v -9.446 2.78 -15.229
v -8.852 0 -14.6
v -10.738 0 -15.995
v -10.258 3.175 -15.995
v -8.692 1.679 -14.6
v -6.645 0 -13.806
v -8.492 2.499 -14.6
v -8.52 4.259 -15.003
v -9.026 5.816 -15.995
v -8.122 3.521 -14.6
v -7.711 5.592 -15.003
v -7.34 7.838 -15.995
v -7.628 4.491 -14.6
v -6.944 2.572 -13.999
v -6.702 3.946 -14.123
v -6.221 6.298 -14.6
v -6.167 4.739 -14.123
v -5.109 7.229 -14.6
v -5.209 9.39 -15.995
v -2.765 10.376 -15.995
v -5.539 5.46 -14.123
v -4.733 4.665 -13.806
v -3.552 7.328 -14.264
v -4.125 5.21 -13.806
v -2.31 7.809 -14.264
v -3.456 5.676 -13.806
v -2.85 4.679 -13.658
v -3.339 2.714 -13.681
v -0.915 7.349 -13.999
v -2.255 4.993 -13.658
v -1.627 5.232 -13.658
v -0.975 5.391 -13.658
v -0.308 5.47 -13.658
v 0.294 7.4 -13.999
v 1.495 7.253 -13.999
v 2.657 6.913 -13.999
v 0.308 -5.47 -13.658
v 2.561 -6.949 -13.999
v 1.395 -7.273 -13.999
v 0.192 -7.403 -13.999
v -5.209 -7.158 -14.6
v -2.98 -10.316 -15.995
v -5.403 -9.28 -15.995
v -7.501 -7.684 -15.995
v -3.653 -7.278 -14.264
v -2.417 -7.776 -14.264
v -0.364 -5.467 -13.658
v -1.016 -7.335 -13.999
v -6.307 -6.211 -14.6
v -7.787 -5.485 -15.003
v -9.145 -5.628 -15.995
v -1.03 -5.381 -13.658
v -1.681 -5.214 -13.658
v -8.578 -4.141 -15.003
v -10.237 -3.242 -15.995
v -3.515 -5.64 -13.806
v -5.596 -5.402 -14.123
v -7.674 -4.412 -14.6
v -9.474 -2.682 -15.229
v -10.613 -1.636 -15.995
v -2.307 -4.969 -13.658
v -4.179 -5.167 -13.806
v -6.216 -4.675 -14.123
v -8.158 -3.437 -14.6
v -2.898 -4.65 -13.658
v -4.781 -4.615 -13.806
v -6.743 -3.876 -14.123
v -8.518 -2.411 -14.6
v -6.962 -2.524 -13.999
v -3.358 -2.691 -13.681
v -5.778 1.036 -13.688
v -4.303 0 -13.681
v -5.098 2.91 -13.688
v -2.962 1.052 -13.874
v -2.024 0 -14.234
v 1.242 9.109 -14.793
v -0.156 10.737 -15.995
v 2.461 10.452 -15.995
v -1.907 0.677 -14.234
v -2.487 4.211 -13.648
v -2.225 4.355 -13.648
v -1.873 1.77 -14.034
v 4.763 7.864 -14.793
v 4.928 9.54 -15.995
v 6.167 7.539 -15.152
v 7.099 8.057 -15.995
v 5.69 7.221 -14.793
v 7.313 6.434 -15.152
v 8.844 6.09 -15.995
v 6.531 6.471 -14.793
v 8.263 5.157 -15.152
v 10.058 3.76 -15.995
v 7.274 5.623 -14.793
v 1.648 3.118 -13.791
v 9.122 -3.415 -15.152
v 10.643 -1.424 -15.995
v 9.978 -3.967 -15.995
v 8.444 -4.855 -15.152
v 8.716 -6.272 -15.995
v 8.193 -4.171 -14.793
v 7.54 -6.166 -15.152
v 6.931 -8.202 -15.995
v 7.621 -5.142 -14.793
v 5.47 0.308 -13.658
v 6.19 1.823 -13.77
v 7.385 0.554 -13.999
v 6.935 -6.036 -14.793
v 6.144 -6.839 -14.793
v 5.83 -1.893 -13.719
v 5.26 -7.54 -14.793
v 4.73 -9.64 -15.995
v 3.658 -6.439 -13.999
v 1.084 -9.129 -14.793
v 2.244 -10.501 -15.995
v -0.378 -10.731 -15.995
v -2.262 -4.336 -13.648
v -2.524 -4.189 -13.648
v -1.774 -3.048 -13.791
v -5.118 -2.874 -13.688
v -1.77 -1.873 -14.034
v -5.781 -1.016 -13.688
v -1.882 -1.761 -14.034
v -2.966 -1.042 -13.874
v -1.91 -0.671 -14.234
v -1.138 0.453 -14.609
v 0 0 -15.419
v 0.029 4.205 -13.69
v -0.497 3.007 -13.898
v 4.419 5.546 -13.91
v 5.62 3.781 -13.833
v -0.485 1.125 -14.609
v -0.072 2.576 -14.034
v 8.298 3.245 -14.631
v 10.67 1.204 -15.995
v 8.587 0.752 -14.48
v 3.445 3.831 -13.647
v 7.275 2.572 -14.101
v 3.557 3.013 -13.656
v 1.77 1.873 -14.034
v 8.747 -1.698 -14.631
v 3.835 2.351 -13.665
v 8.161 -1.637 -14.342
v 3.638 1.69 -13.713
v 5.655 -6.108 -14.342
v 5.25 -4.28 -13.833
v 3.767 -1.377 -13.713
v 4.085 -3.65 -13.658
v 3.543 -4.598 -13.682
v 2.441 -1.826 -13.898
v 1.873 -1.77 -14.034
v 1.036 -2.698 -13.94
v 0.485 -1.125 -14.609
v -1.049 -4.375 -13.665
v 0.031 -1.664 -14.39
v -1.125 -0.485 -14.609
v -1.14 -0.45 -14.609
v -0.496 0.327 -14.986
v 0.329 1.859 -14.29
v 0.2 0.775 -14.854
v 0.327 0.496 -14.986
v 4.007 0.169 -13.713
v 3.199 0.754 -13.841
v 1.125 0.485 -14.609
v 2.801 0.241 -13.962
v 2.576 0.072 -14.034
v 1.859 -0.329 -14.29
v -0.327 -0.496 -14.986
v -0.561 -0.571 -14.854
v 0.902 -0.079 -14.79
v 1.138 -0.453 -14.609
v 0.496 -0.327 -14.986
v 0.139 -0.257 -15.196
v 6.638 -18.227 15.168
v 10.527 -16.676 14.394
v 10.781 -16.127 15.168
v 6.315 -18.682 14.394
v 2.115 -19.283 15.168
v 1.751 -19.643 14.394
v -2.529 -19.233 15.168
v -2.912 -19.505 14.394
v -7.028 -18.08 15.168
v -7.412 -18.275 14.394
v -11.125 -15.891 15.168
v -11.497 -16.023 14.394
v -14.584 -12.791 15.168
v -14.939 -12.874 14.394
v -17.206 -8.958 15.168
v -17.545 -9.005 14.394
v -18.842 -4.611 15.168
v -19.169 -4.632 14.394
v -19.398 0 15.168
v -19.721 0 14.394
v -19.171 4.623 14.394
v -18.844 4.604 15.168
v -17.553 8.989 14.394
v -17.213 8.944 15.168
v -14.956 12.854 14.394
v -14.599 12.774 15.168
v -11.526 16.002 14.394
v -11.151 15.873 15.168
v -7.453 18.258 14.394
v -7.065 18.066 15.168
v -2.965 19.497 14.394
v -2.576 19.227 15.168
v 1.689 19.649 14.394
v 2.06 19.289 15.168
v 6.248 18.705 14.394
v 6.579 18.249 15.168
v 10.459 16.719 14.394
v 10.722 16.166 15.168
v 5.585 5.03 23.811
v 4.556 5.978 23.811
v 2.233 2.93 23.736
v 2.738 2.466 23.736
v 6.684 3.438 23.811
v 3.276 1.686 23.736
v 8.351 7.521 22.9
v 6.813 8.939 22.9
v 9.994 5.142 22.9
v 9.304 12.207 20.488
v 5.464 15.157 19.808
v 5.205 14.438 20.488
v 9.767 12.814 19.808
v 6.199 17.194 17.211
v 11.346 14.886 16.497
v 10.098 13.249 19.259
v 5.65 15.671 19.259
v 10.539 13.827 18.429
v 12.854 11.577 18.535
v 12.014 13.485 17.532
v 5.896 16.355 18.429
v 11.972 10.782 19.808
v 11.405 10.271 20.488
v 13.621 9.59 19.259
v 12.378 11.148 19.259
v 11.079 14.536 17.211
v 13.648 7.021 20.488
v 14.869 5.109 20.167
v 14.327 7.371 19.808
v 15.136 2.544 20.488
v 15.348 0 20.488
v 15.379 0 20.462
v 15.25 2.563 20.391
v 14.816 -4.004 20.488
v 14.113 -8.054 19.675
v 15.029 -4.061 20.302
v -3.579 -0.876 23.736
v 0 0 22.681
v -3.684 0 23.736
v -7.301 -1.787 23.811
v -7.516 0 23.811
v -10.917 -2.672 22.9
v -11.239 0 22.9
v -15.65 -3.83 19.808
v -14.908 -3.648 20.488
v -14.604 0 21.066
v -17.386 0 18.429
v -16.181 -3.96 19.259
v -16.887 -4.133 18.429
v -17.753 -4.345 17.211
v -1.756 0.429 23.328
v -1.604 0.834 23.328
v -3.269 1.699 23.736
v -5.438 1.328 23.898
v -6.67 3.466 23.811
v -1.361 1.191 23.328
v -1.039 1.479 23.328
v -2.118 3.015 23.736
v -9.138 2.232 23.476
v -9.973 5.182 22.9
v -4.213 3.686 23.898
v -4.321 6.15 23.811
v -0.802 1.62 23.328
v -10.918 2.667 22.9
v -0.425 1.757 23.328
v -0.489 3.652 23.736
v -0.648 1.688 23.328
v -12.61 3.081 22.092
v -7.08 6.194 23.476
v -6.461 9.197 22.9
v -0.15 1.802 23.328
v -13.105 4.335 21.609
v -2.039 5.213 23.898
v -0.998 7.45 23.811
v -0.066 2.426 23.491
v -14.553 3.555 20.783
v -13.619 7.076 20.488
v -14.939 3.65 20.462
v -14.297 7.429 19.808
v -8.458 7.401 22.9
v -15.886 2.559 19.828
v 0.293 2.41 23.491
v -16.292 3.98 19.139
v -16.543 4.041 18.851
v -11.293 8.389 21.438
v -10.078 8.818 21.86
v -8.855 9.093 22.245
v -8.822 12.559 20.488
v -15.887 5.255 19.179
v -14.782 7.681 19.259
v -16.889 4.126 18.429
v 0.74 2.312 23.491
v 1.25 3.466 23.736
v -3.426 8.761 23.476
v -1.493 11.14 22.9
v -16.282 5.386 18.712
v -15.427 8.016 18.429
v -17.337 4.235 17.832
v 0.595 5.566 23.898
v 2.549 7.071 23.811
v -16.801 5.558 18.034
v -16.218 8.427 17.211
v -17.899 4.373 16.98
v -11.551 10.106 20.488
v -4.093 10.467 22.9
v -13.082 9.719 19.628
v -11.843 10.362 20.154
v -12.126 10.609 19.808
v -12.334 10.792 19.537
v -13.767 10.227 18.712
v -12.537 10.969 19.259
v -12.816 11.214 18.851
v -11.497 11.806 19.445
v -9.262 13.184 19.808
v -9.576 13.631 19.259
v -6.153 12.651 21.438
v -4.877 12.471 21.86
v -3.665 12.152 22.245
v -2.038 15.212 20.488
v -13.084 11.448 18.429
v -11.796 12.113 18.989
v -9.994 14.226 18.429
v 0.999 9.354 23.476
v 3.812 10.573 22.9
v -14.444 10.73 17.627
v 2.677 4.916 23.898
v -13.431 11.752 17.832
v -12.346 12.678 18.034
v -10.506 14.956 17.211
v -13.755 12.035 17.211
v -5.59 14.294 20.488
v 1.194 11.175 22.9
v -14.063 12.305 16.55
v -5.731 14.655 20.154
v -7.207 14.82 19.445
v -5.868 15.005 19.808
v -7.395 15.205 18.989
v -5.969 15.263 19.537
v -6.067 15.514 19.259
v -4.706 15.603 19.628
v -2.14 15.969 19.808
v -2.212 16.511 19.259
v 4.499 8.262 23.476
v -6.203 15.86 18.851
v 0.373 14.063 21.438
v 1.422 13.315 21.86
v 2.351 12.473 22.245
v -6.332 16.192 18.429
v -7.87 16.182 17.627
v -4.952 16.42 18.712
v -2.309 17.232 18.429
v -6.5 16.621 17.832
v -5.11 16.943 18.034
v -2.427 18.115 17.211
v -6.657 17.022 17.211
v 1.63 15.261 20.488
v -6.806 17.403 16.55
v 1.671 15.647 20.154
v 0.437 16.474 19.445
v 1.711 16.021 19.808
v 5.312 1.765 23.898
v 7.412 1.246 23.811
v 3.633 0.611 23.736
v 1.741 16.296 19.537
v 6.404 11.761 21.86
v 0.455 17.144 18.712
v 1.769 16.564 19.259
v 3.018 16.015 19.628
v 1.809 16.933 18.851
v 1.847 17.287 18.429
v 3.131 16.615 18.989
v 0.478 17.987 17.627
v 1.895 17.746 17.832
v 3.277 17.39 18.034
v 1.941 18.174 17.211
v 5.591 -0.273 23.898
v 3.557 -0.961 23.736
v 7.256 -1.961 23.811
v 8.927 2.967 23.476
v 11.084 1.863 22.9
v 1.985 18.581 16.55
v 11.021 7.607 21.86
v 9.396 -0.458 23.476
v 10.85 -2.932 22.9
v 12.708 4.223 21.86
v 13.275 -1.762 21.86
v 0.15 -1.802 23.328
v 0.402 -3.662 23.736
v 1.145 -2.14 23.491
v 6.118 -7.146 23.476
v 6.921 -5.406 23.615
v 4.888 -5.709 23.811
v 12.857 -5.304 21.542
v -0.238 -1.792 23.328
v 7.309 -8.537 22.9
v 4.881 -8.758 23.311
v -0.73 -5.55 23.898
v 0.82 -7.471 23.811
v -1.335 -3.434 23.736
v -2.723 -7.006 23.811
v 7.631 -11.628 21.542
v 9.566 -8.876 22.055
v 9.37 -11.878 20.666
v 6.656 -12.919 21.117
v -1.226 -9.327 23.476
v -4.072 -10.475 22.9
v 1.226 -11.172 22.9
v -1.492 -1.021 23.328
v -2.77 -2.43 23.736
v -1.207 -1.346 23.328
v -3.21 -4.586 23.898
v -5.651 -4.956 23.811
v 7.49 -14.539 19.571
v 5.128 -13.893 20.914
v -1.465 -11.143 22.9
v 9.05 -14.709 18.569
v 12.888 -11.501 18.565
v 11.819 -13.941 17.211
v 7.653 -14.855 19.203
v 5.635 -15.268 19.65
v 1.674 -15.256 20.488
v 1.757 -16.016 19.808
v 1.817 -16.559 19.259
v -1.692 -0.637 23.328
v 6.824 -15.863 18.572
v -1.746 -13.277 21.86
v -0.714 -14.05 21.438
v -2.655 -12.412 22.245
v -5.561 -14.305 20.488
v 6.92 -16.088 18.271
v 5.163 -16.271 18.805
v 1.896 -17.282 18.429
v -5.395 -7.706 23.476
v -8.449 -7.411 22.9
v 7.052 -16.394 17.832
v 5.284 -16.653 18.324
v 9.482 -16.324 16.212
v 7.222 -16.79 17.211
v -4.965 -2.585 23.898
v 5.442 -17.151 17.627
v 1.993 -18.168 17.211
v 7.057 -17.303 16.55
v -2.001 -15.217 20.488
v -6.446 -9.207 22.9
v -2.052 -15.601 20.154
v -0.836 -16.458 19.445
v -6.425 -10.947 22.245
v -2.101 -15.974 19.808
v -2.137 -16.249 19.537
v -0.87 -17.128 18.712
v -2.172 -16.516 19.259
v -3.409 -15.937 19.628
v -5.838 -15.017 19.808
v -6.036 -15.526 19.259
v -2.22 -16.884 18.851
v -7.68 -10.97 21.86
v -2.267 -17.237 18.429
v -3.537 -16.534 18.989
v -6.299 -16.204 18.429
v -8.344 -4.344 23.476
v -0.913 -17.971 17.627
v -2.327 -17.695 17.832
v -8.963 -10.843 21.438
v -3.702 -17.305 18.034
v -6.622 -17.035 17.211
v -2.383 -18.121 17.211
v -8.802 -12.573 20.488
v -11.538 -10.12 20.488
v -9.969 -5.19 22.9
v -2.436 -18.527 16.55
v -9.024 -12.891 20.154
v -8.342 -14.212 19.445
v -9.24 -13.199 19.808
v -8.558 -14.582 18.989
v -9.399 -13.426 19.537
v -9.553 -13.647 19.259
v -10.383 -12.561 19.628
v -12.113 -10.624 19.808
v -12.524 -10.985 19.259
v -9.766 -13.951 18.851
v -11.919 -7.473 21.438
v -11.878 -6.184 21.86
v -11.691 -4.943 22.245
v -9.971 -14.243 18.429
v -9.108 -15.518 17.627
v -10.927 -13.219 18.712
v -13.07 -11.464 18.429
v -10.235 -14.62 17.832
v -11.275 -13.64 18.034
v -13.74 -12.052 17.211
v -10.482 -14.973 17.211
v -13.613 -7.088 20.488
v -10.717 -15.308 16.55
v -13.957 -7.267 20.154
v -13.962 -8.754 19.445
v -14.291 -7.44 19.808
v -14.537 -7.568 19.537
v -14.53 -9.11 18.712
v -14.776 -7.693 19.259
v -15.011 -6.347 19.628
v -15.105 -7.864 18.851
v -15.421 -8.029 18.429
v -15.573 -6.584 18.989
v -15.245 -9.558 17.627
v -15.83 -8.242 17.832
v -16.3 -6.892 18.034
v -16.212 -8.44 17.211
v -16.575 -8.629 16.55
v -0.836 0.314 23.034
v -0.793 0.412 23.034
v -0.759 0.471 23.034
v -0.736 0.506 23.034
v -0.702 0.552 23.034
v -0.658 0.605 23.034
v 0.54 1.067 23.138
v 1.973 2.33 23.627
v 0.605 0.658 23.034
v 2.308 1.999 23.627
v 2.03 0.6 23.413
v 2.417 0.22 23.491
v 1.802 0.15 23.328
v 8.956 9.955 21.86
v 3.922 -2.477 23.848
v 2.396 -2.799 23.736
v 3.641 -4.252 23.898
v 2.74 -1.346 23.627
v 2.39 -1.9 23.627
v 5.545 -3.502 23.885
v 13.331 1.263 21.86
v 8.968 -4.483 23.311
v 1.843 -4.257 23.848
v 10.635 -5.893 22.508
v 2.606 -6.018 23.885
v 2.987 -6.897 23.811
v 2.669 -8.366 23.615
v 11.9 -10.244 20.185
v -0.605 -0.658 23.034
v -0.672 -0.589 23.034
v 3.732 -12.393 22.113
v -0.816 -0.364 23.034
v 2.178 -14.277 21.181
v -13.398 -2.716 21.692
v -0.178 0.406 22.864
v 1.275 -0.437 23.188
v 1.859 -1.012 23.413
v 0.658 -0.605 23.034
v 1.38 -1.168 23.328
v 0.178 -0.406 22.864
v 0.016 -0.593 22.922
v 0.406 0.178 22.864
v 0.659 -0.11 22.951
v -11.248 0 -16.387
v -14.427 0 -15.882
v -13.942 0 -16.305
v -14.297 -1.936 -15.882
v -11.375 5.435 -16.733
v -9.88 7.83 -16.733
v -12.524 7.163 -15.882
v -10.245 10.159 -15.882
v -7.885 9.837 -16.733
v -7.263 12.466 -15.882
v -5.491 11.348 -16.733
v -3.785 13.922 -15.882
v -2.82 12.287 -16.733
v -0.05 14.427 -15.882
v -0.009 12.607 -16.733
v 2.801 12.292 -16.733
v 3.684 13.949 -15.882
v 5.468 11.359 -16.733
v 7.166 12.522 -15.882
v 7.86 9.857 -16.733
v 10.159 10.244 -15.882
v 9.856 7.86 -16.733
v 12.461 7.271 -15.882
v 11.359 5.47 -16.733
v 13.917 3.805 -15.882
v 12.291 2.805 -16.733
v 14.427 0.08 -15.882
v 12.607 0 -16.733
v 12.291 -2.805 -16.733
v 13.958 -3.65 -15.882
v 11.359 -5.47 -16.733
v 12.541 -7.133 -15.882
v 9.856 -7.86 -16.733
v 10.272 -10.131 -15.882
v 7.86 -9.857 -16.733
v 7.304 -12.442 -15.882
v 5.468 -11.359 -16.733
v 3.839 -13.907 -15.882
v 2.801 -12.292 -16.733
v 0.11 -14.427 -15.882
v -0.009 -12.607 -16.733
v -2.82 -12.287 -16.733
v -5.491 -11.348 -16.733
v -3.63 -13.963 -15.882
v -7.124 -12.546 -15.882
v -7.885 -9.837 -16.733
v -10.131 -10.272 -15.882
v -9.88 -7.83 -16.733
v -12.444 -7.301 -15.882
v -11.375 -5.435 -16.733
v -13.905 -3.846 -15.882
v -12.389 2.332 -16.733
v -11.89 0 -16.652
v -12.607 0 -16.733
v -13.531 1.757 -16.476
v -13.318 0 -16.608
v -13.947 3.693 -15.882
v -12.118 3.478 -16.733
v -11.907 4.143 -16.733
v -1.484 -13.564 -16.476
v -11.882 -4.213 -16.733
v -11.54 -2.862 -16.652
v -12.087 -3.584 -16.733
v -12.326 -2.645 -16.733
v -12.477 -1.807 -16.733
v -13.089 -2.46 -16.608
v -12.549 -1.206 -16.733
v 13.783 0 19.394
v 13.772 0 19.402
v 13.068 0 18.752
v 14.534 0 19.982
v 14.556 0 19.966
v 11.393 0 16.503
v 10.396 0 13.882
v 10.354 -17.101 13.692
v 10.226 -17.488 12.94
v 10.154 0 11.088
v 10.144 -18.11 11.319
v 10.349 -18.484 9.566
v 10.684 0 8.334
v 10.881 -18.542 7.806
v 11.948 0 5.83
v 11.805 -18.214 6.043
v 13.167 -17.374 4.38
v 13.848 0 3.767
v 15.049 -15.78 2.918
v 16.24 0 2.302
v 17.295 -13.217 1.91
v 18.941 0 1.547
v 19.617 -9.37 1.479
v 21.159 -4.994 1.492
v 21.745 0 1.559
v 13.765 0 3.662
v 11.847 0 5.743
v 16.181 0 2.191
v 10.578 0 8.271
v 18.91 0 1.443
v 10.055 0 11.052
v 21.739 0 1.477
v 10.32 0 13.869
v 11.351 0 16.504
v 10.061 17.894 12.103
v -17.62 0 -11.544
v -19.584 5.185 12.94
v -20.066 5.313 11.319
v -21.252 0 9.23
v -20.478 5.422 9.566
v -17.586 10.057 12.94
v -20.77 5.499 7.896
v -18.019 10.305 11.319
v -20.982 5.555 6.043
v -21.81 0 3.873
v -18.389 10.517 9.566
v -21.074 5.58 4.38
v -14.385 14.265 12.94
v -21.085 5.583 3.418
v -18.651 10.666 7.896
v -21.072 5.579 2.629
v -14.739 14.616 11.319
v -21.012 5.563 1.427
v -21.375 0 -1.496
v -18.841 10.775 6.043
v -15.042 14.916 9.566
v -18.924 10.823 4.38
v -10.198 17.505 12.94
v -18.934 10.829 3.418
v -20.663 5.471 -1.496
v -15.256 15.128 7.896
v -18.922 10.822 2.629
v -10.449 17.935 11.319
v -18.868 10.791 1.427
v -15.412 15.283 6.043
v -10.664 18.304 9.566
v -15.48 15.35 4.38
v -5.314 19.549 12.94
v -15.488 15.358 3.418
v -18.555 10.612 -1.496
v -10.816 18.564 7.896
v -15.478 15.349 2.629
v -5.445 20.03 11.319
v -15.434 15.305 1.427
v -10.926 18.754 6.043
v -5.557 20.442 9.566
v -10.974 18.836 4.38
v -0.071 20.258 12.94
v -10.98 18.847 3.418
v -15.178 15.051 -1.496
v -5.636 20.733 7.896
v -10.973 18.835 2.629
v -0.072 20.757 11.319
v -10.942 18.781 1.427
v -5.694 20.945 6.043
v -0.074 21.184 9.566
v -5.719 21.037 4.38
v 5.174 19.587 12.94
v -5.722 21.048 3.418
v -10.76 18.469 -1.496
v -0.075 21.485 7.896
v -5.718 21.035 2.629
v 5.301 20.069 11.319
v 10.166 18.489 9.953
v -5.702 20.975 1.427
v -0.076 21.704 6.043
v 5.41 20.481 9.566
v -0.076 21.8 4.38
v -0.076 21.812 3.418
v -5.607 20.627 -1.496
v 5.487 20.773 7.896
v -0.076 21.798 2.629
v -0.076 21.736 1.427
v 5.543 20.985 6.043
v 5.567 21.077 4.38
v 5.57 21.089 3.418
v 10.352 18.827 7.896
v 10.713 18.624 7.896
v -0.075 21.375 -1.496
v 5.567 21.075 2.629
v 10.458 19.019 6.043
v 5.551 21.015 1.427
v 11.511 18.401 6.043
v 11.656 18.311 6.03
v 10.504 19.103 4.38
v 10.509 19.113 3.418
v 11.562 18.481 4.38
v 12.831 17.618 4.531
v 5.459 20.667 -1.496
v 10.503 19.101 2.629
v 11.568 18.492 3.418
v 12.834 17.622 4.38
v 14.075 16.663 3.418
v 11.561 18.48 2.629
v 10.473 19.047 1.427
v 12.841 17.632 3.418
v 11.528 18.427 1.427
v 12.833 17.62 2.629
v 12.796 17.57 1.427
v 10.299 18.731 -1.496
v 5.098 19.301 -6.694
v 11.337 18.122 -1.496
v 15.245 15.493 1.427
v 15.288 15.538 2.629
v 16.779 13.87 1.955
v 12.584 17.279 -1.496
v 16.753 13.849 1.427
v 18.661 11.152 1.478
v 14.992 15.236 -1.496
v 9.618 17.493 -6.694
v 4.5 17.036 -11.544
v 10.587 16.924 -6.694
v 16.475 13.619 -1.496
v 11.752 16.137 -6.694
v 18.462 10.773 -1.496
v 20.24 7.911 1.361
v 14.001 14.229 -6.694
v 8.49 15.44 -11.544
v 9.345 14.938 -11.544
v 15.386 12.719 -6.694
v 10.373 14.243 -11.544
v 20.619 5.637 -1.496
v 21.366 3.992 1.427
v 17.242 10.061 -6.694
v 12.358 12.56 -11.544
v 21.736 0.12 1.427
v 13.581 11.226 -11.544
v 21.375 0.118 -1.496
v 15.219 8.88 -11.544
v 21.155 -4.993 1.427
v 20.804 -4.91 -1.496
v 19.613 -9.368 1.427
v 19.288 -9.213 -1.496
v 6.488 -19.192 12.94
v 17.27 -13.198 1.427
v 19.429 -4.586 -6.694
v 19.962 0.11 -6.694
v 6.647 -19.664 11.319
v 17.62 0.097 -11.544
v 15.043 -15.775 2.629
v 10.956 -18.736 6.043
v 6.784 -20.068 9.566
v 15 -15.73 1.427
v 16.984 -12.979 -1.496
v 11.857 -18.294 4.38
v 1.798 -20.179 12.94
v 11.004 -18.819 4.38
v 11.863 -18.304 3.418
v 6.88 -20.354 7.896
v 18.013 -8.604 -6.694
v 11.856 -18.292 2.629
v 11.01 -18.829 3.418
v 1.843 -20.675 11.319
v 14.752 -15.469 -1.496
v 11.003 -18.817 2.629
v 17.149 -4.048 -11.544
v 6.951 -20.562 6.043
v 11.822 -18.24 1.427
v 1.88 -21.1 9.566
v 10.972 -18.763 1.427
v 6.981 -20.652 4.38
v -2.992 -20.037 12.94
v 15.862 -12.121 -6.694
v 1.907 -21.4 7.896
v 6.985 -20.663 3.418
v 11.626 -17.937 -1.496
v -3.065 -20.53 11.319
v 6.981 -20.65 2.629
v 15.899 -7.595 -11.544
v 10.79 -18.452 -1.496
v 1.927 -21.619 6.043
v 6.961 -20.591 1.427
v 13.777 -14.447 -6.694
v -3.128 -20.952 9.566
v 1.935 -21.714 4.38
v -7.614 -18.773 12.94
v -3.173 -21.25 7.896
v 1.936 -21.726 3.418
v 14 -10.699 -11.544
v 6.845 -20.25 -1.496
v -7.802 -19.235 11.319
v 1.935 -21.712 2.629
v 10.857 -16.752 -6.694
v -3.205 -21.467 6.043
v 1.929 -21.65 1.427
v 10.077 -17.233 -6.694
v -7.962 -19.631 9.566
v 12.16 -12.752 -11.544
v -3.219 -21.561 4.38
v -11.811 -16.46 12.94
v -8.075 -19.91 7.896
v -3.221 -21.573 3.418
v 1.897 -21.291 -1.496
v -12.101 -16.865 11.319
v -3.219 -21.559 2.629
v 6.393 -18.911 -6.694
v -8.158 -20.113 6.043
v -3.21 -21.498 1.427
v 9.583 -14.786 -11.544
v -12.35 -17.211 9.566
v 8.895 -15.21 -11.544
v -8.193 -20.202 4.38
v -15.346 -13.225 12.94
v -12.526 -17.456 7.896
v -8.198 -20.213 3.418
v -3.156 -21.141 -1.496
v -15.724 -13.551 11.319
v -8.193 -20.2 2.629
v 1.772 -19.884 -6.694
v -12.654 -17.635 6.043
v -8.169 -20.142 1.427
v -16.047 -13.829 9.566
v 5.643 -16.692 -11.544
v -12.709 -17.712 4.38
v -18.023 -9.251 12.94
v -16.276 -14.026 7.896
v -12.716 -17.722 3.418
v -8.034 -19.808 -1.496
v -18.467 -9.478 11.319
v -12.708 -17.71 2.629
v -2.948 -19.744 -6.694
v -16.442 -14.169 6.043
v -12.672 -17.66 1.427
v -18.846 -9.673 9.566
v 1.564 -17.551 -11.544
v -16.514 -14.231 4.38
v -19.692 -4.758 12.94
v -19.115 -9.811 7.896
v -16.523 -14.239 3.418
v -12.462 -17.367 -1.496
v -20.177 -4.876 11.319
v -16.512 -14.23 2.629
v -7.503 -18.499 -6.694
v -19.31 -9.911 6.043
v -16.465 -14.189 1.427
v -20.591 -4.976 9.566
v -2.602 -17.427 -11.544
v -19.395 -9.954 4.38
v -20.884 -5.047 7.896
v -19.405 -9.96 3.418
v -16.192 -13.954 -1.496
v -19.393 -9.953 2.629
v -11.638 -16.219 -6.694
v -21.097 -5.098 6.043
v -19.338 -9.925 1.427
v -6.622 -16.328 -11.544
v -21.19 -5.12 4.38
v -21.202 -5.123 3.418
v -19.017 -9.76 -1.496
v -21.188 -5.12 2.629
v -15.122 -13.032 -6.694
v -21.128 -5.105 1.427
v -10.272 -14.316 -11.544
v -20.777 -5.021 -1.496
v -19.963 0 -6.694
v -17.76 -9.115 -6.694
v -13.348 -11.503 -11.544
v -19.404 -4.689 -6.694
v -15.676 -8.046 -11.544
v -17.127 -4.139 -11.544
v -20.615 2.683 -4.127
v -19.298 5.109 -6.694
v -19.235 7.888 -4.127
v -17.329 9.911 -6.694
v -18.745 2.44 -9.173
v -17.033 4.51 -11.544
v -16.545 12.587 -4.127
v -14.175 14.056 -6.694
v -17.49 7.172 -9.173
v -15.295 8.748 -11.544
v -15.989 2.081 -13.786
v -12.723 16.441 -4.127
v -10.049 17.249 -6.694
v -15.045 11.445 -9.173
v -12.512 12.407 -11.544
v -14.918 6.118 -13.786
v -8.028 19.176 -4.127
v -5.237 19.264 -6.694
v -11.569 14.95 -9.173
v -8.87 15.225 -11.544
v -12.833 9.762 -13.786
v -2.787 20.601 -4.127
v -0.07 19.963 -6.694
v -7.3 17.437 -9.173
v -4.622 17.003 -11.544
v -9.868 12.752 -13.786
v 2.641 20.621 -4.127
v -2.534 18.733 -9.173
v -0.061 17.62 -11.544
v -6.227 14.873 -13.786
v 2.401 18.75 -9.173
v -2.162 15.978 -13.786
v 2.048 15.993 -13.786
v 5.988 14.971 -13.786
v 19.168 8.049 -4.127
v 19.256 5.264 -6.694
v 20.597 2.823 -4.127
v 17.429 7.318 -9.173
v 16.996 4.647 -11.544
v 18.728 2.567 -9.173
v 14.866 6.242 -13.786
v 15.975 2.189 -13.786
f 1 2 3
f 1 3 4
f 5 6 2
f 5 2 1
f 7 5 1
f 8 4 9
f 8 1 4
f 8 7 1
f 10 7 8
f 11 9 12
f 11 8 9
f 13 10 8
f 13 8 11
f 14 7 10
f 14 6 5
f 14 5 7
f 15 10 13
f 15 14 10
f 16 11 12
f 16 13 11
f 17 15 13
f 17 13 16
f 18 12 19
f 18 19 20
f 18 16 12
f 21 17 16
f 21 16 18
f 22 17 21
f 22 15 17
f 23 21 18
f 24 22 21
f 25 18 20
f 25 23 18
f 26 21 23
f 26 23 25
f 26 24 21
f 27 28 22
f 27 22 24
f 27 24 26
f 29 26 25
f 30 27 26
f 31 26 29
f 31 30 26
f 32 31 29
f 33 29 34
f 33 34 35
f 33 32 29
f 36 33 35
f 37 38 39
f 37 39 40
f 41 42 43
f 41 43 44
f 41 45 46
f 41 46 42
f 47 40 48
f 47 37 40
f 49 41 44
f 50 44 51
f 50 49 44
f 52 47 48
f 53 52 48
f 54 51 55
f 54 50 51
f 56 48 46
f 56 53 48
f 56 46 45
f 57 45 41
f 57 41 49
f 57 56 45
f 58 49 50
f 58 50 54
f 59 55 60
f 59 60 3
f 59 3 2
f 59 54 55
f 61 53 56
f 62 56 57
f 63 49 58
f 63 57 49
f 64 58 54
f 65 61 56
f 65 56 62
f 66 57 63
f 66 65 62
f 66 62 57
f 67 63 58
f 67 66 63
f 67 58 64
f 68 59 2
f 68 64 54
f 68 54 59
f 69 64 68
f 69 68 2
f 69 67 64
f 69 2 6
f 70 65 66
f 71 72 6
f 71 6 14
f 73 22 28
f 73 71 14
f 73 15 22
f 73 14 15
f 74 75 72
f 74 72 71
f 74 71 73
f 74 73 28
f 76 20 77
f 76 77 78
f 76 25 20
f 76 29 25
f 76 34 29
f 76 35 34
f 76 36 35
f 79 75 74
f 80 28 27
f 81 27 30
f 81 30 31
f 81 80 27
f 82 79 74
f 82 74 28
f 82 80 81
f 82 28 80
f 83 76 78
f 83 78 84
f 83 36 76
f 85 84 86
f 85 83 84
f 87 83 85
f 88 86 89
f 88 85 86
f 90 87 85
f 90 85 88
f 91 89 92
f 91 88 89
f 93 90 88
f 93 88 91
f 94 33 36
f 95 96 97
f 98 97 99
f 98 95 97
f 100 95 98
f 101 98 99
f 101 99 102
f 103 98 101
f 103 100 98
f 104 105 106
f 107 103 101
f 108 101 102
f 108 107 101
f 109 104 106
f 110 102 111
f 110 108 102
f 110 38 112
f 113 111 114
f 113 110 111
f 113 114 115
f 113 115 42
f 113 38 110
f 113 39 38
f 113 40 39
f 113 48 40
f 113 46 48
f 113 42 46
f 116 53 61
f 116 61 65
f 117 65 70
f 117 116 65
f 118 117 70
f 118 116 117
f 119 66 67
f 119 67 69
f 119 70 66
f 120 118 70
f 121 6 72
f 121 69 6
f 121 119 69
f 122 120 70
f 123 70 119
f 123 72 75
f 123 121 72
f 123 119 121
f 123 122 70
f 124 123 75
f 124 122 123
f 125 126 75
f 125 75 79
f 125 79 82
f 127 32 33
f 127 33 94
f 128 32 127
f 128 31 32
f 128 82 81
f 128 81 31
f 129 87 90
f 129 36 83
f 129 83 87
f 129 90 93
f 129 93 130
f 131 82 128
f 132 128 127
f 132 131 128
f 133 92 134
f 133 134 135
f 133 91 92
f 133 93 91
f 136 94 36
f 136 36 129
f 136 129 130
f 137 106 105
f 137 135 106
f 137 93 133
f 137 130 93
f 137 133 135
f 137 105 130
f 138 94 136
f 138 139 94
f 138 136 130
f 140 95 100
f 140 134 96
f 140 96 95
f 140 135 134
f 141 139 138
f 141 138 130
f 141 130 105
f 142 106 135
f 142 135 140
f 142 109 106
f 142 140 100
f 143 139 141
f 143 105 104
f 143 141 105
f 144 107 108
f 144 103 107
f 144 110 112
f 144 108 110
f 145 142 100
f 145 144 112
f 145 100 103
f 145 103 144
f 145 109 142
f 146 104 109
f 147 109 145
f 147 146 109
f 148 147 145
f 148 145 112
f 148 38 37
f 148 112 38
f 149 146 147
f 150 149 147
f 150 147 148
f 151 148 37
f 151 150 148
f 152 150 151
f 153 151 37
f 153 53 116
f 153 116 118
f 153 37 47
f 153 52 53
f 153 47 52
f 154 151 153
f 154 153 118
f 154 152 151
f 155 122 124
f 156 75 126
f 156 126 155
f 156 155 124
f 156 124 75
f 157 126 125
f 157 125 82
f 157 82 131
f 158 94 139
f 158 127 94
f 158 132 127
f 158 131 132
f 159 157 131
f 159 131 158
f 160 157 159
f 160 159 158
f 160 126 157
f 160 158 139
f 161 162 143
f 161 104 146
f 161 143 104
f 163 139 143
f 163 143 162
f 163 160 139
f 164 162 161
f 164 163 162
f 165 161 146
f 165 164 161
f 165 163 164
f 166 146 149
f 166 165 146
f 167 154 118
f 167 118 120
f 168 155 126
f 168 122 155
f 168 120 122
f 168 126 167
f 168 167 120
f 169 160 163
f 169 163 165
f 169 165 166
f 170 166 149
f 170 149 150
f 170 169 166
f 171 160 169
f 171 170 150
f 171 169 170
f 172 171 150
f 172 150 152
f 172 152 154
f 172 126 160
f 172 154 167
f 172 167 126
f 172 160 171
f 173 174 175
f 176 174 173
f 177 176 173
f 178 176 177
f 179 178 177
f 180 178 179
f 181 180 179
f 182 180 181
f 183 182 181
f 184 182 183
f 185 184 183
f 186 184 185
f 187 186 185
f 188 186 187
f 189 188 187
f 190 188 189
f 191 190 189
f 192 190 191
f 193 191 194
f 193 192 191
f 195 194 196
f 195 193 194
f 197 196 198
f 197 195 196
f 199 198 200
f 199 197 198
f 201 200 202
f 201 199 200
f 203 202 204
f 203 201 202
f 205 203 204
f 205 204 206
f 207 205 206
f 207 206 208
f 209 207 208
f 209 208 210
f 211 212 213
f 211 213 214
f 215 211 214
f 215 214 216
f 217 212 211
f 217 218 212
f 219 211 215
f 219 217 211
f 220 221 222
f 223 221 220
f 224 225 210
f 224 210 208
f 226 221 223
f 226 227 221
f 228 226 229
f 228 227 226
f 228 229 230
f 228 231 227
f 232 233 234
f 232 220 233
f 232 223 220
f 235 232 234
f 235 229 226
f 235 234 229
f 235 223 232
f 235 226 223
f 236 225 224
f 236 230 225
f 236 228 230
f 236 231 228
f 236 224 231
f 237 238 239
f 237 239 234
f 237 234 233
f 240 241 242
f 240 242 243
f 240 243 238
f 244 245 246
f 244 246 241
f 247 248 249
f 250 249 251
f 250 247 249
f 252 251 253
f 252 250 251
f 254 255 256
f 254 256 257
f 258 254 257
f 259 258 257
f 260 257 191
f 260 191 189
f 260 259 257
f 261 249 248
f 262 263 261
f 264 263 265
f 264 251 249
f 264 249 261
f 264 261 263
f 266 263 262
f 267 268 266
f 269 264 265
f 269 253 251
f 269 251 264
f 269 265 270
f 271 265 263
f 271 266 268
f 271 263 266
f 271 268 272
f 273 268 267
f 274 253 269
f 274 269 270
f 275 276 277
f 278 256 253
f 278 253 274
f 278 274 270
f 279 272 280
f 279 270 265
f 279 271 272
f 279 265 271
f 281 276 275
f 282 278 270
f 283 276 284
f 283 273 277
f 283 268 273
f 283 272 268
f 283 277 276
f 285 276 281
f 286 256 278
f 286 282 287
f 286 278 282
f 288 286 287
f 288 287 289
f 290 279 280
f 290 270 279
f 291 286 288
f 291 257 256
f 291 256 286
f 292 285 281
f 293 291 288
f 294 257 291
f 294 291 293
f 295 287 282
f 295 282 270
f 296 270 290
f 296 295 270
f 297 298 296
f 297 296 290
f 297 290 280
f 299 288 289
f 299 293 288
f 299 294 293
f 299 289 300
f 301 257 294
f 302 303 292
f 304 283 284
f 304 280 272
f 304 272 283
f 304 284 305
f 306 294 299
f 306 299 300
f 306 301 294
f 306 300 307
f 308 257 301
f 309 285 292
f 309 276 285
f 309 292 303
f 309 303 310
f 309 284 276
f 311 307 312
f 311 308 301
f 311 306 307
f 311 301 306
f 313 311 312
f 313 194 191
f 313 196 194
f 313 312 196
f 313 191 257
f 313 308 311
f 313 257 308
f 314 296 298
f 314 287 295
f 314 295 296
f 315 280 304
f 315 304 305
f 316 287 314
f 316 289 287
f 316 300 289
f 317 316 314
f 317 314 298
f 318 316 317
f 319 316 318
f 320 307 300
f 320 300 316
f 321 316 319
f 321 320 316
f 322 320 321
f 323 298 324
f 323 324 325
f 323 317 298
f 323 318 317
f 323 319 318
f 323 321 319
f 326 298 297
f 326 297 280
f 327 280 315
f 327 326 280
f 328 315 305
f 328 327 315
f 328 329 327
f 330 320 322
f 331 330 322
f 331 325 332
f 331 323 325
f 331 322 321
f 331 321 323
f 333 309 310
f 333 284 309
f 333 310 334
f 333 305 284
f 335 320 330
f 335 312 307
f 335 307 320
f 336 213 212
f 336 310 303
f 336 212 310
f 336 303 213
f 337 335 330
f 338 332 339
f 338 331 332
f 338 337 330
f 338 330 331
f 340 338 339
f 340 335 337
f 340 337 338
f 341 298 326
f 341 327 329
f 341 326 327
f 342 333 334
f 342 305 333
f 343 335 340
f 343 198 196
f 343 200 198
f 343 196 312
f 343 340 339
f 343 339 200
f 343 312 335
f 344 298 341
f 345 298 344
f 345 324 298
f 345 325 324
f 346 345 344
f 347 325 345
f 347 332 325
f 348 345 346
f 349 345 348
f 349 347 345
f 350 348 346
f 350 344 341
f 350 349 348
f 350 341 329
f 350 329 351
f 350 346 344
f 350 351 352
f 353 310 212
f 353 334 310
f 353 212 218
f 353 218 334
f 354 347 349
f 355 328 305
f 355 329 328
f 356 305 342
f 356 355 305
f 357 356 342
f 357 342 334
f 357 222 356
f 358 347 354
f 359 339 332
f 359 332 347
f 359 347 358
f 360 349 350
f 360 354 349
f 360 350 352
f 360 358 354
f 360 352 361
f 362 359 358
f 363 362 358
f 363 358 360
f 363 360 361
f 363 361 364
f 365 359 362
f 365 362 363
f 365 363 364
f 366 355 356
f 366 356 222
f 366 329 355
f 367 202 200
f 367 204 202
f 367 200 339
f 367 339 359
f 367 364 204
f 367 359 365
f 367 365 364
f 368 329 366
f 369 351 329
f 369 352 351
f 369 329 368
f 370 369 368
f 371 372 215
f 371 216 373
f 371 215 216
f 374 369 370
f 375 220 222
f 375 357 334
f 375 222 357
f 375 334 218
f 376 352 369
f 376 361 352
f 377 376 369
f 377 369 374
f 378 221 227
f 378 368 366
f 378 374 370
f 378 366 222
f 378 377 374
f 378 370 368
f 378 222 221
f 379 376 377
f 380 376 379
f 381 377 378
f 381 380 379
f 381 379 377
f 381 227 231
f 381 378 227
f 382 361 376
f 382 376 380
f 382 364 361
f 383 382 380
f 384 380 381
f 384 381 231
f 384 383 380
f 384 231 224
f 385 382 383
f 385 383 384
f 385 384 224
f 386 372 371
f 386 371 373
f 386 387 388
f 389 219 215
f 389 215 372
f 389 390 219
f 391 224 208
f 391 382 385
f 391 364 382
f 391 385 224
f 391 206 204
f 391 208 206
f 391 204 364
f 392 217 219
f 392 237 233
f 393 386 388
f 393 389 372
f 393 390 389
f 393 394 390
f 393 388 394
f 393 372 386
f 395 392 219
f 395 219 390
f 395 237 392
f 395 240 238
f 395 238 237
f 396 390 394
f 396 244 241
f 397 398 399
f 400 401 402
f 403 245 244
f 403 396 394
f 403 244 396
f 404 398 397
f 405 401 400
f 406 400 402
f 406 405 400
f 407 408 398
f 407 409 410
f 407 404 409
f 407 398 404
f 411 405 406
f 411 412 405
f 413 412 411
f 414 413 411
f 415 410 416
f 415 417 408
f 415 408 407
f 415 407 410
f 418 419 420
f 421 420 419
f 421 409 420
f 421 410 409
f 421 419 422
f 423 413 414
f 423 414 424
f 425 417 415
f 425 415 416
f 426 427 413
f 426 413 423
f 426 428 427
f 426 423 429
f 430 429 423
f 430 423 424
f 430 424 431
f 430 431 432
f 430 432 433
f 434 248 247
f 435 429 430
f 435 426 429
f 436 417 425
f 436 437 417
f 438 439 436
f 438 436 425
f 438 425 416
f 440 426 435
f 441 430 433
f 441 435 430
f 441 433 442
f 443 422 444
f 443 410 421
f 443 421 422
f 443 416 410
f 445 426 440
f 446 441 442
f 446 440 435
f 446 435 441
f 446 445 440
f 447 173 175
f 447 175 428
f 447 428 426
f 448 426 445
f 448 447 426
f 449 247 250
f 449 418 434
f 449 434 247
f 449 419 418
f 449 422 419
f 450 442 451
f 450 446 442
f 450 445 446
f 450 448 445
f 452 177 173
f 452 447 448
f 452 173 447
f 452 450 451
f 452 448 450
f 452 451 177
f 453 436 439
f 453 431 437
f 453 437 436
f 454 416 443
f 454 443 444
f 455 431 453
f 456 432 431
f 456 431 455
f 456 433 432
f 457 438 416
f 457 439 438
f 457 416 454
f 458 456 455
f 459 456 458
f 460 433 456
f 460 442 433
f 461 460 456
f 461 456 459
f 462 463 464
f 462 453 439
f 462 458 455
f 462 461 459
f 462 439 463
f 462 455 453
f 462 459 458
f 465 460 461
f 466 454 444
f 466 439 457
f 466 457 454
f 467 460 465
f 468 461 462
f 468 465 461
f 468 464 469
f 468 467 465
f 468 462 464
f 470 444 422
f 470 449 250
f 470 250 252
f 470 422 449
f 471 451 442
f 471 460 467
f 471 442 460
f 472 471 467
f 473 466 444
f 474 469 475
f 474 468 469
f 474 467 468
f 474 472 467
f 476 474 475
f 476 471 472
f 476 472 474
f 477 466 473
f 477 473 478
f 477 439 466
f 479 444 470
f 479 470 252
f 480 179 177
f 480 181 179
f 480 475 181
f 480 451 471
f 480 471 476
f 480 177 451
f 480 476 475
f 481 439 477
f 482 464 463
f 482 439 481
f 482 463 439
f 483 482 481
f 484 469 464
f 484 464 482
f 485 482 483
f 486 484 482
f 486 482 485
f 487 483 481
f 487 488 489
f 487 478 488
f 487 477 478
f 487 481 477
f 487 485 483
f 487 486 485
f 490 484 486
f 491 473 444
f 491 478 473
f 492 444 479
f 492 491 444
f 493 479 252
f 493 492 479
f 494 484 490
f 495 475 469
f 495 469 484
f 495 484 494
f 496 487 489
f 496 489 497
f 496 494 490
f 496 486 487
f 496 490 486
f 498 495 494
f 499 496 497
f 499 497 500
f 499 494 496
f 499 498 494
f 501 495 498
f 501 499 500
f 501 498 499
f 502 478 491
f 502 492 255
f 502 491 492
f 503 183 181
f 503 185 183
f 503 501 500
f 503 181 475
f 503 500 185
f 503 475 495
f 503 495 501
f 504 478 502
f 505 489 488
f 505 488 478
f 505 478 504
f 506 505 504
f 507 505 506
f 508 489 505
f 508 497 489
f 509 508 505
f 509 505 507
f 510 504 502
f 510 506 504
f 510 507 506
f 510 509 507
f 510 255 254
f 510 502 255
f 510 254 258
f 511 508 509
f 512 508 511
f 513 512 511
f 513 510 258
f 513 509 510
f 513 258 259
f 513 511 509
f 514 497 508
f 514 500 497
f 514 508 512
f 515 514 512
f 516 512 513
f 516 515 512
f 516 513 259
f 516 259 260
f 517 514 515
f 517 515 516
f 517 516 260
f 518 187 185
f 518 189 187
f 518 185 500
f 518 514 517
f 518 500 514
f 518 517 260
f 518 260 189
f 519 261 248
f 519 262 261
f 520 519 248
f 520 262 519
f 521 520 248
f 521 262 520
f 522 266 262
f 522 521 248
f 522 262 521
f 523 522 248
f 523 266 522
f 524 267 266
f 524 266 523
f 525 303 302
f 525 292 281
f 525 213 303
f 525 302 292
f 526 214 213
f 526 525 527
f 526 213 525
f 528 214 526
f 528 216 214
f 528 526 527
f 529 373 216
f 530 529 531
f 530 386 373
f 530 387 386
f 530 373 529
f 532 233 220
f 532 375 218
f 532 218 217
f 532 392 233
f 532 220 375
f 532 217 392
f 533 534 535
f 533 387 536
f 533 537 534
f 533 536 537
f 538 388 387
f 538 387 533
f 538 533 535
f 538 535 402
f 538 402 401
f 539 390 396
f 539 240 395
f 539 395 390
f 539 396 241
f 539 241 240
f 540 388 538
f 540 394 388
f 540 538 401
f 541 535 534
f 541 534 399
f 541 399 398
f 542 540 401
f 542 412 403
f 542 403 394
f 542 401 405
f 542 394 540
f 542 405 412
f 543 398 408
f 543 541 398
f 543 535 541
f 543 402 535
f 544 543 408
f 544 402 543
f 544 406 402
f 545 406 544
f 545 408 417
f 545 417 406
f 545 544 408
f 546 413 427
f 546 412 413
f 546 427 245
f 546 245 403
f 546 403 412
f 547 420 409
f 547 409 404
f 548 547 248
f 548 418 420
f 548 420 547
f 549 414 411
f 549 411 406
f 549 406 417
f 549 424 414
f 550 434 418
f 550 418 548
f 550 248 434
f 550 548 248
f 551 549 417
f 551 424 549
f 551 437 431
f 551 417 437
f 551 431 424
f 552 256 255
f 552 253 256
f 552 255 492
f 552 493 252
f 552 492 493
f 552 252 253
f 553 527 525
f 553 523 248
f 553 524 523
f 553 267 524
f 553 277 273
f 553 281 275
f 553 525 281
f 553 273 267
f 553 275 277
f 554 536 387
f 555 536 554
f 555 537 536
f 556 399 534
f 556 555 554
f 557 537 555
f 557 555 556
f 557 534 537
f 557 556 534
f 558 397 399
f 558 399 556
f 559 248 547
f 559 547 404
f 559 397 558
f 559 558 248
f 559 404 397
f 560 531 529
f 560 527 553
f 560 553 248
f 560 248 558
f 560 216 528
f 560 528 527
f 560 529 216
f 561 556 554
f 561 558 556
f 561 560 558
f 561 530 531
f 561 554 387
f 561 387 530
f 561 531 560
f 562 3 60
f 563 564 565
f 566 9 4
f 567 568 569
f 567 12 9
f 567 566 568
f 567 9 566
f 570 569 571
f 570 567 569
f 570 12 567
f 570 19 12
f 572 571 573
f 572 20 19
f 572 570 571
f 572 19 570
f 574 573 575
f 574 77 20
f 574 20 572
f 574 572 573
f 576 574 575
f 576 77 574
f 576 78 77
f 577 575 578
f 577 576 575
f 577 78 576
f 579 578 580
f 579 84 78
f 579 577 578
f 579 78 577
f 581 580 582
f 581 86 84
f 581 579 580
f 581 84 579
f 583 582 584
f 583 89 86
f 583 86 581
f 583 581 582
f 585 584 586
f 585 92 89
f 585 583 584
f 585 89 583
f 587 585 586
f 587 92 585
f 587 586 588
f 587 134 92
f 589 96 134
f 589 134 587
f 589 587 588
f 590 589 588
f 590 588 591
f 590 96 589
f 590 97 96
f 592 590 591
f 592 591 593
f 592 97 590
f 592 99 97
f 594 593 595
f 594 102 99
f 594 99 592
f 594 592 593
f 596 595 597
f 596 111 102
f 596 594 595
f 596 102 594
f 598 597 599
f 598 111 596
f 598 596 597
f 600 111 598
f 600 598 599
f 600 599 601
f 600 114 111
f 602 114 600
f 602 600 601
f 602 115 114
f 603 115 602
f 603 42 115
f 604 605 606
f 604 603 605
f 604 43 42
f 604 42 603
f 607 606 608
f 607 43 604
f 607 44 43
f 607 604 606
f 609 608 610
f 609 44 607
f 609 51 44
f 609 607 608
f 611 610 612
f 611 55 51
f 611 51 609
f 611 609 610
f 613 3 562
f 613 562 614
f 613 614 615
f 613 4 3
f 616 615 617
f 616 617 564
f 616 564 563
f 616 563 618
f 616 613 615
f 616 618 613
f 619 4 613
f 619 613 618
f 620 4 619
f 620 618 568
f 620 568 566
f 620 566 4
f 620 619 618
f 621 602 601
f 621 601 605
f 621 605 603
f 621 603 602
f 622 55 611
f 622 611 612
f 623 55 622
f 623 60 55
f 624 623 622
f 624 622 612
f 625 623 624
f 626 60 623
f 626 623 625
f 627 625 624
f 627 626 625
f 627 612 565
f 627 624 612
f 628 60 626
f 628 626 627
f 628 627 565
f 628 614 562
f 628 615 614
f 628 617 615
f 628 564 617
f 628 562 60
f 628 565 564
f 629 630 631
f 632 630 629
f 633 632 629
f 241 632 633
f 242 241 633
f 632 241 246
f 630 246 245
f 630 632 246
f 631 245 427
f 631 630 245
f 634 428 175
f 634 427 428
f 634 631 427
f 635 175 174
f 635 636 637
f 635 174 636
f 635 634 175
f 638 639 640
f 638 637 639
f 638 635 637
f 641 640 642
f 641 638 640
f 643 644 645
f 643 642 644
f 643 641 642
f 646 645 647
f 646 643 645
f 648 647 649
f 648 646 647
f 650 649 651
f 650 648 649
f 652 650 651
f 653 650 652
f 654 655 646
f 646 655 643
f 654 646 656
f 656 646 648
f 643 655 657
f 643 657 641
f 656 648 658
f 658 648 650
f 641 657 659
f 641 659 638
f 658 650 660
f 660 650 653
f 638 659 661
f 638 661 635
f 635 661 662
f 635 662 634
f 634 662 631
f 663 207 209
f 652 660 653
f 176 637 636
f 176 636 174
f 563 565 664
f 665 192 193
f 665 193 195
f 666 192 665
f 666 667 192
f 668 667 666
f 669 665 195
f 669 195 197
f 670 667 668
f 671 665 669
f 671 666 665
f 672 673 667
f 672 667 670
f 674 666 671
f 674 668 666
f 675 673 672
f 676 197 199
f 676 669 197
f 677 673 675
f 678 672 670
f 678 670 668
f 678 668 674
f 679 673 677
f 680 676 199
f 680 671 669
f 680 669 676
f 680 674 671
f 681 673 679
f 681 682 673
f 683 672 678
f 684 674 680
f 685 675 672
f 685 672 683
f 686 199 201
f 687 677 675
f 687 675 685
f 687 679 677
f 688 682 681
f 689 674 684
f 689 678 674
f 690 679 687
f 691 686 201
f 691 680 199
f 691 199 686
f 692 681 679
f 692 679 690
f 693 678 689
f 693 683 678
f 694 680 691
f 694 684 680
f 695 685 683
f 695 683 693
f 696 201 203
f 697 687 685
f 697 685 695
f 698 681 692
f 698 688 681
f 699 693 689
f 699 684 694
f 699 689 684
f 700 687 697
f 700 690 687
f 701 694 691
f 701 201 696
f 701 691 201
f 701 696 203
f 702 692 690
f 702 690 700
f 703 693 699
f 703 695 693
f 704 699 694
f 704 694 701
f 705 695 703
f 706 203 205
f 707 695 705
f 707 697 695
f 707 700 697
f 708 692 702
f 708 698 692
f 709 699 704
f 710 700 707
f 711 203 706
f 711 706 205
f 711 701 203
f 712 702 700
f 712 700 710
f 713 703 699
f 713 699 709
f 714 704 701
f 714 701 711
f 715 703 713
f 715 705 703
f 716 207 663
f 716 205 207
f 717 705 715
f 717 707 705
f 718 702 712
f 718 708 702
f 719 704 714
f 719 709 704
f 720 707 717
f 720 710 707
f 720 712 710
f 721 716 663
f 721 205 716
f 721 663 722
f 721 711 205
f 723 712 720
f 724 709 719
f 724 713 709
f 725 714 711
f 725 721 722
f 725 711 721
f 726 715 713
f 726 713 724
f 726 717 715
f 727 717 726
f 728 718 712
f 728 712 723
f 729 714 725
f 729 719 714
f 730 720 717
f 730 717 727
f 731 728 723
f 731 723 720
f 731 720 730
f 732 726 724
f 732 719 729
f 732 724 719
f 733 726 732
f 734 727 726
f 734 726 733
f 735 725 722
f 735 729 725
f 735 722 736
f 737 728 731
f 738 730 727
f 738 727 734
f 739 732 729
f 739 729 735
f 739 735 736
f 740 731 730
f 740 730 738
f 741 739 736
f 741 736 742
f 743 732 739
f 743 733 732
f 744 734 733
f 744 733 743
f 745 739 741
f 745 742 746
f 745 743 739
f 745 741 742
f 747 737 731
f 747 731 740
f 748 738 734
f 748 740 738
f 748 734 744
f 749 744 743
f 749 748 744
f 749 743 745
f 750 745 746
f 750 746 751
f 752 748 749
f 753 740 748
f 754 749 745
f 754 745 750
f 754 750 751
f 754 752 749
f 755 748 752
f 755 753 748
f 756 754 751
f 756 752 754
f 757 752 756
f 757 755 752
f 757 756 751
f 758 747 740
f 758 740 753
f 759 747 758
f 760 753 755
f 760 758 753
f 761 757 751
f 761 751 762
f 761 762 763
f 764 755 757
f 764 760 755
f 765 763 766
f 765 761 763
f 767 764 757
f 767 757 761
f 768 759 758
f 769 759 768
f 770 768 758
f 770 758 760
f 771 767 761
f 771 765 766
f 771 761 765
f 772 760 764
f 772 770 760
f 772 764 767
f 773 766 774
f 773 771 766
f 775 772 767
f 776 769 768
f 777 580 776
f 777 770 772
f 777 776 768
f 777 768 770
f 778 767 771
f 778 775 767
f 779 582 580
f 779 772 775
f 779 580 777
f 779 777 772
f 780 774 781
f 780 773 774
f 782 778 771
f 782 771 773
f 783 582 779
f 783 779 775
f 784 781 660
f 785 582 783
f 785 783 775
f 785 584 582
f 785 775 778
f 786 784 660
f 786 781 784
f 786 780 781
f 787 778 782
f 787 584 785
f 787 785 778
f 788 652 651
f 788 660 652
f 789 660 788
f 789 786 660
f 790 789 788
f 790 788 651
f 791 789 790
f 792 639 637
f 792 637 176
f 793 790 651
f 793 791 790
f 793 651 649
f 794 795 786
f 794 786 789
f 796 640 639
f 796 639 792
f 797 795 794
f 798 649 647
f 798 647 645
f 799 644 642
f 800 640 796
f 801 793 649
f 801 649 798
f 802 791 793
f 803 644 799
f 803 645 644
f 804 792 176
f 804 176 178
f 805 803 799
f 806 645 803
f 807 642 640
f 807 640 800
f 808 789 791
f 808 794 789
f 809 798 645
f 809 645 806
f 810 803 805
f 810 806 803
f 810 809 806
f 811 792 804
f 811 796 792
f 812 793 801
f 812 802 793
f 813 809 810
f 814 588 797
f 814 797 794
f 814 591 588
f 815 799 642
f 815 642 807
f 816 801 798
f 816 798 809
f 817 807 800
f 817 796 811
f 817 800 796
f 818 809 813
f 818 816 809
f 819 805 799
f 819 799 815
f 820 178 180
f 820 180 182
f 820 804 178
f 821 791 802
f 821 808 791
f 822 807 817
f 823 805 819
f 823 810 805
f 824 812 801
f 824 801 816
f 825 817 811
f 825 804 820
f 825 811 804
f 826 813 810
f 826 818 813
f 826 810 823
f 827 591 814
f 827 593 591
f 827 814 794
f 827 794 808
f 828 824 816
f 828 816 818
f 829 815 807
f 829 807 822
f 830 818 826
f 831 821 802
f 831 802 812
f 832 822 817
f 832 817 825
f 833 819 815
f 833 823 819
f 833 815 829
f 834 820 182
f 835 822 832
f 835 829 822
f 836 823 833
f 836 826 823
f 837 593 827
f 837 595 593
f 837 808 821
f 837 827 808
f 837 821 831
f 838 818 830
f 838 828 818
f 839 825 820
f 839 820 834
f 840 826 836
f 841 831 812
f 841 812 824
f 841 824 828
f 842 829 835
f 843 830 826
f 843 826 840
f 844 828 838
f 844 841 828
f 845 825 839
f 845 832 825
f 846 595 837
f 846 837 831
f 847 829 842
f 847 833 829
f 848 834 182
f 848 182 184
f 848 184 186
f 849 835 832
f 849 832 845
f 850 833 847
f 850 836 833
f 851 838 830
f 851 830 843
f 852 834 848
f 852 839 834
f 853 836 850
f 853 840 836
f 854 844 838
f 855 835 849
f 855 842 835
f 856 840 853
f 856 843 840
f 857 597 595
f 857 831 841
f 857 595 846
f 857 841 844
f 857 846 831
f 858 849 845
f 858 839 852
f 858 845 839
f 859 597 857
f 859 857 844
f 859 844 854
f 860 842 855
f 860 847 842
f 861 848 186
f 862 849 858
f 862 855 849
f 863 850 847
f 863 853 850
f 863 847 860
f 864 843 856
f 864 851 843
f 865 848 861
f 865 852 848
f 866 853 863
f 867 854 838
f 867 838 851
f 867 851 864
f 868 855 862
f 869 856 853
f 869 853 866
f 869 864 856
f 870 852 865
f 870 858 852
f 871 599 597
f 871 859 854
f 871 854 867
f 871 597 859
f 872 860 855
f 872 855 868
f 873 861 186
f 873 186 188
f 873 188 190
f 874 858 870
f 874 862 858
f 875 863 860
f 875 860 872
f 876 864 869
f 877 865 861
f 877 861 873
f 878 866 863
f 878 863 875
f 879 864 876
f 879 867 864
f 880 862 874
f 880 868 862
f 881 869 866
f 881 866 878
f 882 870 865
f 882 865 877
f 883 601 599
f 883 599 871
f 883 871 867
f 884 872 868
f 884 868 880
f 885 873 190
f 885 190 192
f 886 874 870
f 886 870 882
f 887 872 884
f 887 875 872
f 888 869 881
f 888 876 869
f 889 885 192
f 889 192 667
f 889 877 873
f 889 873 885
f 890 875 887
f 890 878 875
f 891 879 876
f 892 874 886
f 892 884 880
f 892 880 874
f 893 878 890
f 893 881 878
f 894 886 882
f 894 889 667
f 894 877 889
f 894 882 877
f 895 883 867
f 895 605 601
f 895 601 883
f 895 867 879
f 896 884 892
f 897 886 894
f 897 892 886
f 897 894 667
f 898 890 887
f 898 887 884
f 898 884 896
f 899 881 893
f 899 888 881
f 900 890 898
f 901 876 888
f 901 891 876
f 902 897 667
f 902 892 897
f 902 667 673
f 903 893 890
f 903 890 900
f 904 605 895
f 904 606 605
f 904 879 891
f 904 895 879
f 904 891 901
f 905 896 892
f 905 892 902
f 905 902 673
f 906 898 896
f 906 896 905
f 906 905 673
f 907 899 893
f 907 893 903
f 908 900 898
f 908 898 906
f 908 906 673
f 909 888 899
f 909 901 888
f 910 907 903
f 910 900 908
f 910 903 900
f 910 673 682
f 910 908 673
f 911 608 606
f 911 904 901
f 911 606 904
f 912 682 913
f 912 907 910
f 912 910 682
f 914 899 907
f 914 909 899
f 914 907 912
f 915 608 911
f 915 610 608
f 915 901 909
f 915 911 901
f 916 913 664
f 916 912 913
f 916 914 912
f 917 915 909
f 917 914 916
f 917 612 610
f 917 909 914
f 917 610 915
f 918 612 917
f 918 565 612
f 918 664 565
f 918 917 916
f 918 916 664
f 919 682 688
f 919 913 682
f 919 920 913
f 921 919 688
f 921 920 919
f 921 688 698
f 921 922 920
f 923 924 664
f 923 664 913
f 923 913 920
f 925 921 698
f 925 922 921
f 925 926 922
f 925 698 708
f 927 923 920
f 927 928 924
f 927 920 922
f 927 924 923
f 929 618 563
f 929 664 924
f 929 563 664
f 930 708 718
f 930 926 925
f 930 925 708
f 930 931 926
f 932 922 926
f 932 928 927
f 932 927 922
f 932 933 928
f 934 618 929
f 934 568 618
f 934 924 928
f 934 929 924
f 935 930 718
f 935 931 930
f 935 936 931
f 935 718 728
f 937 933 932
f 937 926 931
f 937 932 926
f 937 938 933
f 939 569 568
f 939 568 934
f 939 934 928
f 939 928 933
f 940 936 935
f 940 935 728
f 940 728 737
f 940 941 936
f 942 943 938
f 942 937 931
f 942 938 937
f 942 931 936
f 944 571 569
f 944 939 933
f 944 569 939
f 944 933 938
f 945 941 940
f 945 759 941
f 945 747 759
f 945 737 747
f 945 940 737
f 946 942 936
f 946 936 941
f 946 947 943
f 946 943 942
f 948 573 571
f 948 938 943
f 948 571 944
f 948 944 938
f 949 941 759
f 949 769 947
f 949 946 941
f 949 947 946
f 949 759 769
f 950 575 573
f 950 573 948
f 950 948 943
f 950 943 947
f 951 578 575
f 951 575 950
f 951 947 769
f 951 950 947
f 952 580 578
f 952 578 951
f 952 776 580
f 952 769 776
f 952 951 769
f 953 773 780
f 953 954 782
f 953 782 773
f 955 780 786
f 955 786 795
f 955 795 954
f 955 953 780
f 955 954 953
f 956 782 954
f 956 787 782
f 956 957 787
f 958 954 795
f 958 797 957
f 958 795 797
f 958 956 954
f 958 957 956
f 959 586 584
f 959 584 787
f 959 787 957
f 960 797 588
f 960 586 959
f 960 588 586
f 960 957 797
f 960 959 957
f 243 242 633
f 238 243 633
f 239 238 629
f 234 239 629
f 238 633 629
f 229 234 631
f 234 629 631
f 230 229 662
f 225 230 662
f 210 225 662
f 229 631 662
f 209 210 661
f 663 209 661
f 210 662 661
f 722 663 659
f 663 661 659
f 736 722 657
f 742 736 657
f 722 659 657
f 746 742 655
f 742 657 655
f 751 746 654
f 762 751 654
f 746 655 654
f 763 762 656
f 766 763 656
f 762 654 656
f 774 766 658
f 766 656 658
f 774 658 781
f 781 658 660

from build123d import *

# Parameters (mm, degrees)
F2_R     = 10.16
F3_DEPTH = 21.8131542984
F4_R     = 2.54
F5_R     = 10.16
F6_DEPTH = 21.8131542984


# Not quite as in the source:
# - a feature names something its author has since deleted; it is built from what else it names


with BuildPart() as f1:
    # F0 (on Front) → F1 (revolve)
    with BuildSketch(Plane.XZ):
        with BuildLine():
            ThreePointArc((-12.2520654017, -18.0816771193), (-6.7605609497, -13.8304712842), (0, -15.4192405701))
            Line((0, -15.4192405701), (0, 22.6807594299))
            ThreePointArc((0, 22.6807594299), (-11.239053287, 22.9003327562), (-19.3984057777, 15.1679658374))
            ThreePointArc((-19.3984057777, 15.1679658374), (-19.5624851514, 14.7821444157), (-19.7210129028, 14.394008921))
            ThreePointArc((-19.7210129028, 14.394008921), (-21.0686031127, -3.0126367804), (-12.2520654017, -18.0816771193))
        make_face()
    revolve(axis=Axis((0, 0, 3.6307594299), (0, 0, -1)))

    # F2 (on Front) → F3 (cut, through all)
    with BuildSketch(Plane.XZ):
        with Locations((20.2043764293, 11.5205561742)):
            Circle(F2_R)
    extrude(amount=-F3_DEPTH, mode=Mode.SUBTRACT)

    # F4
    f4_edges = [f1.edges().sort_by_distance(p)[0] for p in [
        (12.252065, 0, -18.081677),
    ]]
    fillet(f4_edges, radius=F4_R)

    # F5 (on Front) → F6 (cut, through all)
    with BuildSketch(Plane.XZ):
        with Locations((20.2997829765, 11.6159608588)):
            Circle(F5_R)
    extrude(amount=F6_DEPTH, mode=Mode.SUBTRACT)


solid = f1.part
